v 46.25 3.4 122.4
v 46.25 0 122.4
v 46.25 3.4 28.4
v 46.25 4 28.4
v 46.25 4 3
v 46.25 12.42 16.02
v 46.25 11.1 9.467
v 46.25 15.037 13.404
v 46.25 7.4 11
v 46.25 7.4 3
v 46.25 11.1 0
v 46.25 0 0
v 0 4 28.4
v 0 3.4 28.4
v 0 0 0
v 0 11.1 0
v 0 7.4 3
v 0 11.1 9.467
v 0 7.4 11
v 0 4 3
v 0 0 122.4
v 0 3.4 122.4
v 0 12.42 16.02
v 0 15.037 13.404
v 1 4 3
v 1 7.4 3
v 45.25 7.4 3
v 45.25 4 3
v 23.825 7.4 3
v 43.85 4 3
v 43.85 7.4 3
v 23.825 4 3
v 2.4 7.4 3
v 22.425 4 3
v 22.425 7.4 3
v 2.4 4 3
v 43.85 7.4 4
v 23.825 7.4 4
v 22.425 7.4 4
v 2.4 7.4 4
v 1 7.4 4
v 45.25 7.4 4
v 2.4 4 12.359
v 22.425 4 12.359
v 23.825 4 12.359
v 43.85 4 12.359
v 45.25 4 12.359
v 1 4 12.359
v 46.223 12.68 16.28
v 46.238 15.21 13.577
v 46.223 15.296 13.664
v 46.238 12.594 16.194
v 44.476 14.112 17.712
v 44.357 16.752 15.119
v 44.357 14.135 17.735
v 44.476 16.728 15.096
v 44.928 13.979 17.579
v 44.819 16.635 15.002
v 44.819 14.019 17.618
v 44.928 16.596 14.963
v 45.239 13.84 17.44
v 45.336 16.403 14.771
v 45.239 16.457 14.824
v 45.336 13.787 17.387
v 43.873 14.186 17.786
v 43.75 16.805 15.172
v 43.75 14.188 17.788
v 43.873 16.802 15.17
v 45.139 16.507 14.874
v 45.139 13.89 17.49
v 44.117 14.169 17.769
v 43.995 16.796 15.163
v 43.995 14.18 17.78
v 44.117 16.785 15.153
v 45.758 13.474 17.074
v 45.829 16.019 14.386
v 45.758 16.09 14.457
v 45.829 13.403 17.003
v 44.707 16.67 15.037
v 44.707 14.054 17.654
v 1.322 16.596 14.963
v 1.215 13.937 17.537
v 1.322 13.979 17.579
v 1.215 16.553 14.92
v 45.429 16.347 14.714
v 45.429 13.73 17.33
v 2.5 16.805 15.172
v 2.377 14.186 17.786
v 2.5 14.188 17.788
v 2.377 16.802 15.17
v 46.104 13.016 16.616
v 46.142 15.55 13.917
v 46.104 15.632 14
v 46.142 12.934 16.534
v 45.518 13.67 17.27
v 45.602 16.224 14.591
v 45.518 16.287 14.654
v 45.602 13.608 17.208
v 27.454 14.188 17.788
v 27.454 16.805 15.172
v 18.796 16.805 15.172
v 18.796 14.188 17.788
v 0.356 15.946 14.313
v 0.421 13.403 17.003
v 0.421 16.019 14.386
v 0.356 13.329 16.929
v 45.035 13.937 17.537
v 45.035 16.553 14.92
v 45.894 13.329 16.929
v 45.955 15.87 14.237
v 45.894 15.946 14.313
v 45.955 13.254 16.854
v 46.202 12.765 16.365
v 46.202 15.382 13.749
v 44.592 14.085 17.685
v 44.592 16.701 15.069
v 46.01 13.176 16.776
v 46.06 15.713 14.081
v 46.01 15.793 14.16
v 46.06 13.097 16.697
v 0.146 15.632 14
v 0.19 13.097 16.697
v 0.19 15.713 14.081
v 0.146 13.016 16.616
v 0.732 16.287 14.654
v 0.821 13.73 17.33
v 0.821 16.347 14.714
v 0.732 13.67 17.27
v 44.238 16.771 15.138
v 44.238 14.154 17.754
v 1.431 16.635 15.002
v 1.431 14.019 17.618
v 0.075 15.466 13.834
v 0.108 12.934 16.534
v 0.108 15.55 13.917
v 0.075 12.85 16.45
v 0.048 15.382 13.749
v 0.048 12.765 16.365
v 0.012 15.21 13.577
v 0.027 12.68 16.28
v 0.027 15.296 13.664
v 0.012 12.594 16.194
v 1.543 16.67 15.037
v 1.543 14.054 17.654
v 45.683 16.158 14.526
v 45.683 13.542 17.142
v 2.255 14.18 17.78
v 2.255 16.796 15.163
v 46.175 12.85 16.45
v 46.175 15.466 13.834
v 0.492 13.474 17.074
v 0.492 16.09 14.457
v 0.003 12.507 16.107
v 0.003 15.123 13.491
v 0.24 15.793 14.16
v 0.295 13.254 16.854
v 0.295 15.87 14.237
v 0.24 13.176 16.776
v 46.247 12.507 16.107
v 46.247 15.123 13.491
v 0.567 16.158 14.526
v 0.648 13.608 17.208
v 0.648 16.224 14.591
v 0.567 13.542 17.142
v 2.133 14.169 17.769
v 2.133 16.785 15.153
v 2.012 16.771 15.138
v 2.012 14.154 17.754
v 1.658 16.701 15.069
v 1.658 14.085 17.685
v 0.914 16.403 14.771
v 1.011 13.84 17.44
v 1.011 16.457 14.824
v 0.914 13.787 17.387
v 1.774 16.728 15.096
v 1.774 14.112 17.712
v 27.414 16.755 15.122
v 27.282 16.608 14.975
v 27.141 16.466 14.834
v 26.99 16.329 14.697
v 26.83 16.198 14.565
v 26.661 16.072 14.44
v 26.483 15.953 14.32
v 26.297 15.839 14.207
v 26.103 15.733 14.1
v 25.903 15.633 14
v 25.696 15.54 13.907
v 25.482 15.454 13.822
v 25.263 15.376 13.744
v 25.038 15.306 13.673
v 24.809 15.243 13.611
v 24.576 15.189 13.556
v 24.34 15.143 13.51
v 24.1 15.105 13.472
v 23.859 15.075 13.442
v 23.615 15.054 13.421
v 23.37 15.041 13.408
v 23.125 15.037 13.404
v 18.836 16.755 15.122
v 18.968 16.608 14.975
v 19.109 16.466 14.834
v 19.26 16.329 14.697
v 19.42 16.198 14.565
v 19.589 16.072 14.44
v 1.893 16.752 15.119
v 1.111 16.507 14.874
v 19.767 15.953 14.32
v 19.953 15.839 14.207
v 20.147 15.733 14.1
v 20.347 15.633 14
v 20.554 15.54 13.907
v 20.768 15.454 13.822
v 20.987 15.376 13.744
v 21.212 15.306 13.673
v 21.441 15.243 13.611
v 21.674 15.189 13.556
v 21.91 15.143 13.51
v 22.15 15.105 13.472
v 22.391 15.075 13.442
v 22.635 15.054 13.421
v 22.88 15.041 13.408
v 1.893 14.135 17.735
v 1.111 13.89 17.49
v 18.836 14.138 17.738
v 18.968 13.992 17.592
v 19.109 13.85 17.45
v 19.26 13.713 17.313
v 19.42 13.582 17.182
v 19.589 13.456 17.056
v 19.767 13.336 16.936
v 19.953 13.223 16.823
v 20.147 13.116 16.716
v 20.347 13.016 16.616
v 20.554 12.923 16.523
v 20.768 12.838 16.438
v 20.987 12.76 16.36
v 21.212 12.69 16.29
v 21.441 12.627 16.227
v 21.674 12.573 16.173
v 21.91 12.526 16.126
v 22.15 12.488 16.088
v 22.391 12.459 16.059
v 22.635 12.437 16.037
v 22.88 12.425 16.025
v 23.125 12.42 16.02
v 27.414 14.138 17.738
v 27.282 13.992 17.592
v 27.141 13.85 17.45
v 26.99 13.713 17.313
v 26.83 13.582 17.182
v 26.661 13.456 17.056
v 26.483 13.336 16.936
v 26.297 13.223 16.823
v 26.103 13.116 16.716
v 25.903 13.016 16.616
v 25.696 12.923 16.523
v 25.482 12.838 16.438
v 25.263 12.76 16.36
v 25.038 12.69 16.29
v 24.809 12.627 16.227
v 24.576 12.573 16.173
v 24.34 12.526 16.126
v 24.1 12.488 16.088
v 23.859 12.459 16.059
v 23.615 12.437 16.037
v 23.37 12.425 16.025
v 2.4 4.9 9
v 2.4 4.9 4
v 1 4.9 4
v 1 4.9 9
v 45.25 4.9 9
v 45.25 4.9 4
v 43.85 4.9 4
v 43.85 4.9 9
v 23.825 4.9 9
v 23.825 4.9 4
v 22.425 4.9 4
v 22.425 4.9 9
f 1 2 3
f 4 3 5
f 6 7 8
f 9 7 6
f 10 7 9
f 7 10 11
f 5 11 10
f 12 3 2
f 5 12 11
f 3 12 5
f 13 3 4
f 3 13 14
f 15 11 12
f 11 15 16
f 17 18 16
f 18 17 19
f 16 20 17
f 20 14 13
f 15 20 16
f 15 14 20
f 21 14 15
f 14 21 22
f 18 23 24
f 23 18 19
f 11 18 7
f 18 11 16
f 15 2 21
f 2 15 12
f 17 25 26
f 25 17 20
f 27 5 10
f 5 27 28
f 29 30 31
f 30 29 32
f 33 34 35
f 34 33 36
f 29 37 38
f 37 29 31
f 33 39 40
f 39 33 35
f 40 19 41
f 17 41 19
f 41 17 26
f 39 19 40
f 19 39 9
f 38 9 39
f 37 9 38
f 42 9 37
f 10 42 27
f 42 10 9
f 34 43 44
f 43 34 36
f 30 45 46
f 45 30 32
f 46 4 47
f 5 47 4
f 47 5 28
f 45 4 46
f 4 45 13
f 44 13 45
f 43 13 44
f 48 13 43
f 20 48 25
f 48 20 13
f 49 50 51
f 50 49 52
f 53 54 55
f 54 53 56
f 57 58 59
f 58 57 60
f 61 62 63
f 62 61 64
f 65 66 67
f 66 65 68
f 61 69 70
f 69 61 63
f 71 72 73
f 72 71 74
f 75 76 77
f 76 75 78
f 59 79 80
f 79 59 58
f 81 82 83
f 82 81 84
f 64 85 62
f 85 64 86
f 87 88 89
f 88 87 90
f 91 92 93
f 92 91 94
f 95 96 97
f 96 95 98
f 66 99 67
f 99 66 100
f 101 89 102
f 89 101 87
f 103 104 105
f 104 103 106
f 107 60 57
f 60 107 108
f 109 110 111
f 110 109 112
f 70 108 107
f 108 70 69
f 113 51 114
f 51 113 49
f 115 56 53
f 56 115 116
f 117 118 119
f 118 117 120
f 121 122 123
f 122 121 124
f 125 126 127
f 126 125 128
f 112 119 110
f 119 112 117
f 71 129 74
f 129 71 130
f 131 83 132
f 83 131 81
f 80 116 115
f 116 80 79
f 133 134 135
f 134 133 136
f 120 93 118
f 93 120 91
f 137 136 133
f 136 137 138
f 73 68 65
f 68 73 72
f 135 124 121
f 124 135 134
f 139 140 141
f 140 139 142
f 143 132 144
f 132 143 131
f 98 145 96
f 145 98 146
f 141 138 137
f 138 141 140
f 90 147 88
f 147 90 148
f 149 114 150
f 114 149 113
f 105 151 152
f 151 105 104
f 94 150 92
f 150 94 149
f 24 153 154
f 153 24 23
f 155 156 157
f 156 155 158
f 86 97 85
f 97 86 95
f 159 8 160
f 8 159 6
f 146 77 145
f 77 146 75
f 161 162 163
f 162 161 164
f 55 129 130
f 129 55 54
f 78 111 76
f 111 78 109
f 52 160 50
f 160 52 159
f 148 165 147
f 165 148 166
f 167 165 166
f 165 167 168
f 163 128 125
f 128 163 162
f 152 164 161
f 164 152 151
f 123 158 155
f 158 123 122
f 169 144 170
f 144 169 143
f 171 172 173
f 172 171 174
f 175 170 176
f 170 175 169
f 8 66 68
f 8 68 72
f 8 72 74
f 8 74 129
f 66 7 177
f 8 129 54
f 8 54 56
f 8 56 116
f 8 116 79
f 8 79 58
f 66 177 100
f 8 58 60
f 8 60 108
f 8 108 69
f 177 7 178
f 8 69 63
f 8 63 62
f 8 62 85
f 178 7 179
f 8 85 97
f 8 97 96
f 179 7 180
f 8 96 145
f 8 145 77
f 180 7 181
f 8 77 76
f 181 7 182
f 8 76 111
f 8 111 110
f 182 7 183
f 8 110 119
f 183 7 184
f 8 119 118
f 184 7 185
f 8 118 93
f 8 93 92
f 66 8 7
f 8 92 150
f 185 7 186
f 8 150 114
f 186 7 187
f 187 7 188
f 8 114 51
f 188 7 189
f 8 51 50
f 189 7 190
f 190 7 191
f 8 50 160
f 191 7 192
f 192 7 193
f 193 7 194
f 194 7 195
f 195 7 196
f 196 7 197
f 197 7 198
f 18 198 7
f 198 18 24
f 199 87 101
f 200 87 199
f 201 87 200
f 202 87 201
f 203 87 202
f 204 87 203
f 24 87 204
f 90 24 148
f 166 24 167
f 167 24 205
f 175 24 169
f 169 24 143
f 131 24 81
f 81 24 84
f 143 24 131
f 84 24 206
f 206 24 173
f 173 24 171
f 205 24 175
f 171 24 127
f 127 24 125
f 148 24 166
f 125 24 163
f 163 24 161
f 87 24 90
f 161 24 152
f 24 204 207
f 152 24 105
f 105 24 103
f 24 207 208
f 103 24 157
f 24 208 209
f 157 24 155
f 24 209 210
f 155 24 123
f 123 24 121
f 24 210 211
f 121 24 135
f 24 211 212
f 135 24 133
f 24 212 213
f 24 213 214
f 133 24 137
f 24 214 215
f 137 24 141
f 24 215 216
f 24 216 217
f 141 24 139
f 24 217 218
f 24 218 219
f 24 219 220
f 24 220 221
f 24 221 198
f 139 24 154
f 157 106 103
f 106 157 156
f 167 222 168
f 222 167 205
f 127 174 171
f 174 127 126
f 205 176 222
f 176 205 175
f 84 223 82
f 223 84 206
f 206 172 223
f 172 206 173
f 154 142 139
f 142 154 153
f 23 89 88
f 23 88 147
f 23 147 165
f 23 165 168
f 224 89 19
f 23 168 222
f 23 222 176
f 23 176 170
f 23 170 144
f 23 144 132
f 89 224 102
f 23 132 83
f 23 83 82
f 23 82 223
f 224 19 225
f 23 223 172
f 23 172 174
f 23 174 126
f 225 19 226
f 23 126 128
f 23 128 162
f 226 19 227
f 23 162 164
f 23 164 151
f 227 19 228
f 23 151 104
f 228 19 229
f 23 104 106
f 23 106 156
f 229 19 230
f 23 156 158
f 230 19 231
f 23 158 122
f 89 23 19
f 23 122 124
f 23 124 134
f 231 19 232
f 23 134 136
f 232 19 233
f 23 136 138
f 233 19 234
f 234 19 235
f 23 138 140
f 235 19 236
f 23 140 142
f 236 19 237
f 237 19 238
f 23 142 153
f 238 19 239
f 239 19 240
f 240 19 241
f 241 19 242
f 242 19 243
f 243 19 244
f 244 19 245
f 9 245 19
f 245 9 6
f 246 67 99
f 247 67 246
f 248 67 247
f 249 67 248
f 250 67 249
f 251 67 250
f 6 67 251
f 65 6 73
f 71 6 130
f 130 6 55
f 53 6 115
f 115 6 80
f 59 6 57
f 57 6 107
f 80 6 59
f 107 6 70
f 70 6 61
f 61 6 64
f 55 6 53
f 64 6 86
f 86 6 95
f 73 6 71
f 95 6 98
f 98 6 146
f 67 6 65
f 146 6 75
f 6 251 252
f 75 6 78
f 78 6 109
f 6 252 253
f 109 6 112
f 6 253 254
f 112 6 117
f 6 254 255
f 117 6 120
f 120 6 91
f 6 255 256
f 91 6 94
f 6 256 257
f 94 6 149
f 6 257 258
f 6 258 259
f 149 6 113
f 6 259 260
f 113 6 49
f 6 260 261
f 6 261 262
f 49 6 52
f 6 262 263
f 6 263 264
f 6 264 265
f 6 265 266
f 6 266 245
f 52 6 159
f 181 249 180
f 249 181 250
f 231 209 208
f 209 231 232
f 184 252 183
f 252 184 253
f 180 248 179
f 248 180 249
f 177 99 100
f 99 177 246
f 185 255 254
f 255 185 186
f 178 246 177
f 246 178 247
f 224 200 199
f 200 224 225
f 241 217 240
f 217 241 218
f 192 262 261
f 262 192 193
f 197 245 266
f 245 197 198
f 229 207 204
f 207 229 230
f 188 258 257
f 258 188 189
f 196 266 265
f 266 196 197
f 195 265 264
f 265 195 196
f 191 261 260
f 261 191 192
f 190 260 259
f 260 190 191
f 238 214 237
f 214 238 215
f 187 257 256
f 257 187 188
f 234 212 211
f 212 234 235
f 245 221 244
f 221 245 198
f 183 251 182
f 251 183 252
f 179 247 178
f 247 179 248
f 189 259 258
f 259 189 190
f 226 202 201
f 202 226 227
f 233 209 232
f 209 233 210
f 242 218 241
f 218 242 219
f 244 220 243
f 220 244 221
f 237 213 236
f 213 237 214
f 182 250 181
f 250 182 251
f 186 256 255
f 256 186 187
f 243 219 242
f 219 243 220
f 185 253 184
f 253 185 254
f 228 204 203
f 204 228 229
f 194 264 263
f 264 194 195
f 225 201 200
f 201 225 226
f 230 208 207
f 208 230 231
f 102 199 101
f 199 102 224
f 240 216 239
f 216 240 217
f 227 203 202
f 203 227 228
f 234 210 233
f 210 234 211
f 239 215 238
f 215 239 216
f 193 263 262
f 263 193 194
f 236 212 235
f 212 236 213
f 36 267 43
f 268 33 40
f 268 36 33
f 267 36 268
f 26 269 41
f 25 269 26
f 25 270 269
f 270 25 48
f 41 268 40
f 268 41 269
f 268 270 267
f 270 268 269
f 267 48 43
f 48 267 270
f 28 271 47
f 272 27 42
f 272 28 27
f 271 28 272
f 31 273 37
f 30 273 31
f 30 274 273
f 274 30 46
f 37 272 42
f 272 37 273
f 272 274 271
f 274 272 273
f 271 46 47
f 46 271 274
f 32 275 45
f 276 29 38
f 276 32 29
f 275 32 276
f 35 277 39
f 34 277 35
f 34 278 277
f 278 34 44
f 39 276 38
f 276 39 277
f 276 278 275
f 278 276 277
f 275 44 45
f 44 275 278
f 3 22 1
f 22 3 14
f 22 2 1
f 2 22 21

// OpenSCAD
$fn=128;
bb_width = 46.25;
bb_height = 11.1;
bb_depth = 28.4;

translate([0, 0, bb_depth]) cube([bb_width, 3.4, 47]);
translate([0, 0, bb_depth + 47]) cube([bb_width, 3.4, 47]);

// basic structure
difference() {
  cube([bb_width, bb_height, bb_depth]);
  translate([0, 4, 3]) translate([-1, 0, 0]) cube([bb_width + 2, 3.4, bb_depth]);
  translate([0, 4 + 3.4 - 1, 11]) translate([-1, 0, 0]) cube([bb_width + 2, 10, bb_depth]);
}

//angled piece
translate([0, 4 + 3.4, 11]) rotate([-45, 0, 0]) {
  myd=5;
  difference() {
    hull() {
      cube([bb_width, 3.7, 9.6-myd]);
      translate([myd / 2, 0, 9.6 - (myd / 2)]) rotate([-90, 0, 0]) cylinder(h=3.7, d=myd);
      translate([bb_width - (myd / 2), 0, 9.6 - (myd / 2)]) rotate([-90, 0, 0]) cylinder(h=3.7, d=myd);
    }
    translate([bb_width / 2, -1, 9.6+myd/2]) rotate([-90, 0, 0]) cylinder(h=3.7+2, d=2*myd);
  }
}

//three stegs
translate([1, 0, 0]) steg();
translate([bb_width - 1.4 - 1, 0, 0]) steg();
translate([(bb_width / 2) - (1.4 / 2), 0, 0]) steg();
module steg() {
  difference() {
    translate([0, 0, 3]) cube([1.4, 10, 9.5]);
    translate([-1, 3.4 + 1.5, 4]) cube([3.4, 10, 11]);
    translate([-1, 3.4 + 1.5, 9]) rotate([15, 0, 0]) cube([3.4, 10, 11]);
  }
}
